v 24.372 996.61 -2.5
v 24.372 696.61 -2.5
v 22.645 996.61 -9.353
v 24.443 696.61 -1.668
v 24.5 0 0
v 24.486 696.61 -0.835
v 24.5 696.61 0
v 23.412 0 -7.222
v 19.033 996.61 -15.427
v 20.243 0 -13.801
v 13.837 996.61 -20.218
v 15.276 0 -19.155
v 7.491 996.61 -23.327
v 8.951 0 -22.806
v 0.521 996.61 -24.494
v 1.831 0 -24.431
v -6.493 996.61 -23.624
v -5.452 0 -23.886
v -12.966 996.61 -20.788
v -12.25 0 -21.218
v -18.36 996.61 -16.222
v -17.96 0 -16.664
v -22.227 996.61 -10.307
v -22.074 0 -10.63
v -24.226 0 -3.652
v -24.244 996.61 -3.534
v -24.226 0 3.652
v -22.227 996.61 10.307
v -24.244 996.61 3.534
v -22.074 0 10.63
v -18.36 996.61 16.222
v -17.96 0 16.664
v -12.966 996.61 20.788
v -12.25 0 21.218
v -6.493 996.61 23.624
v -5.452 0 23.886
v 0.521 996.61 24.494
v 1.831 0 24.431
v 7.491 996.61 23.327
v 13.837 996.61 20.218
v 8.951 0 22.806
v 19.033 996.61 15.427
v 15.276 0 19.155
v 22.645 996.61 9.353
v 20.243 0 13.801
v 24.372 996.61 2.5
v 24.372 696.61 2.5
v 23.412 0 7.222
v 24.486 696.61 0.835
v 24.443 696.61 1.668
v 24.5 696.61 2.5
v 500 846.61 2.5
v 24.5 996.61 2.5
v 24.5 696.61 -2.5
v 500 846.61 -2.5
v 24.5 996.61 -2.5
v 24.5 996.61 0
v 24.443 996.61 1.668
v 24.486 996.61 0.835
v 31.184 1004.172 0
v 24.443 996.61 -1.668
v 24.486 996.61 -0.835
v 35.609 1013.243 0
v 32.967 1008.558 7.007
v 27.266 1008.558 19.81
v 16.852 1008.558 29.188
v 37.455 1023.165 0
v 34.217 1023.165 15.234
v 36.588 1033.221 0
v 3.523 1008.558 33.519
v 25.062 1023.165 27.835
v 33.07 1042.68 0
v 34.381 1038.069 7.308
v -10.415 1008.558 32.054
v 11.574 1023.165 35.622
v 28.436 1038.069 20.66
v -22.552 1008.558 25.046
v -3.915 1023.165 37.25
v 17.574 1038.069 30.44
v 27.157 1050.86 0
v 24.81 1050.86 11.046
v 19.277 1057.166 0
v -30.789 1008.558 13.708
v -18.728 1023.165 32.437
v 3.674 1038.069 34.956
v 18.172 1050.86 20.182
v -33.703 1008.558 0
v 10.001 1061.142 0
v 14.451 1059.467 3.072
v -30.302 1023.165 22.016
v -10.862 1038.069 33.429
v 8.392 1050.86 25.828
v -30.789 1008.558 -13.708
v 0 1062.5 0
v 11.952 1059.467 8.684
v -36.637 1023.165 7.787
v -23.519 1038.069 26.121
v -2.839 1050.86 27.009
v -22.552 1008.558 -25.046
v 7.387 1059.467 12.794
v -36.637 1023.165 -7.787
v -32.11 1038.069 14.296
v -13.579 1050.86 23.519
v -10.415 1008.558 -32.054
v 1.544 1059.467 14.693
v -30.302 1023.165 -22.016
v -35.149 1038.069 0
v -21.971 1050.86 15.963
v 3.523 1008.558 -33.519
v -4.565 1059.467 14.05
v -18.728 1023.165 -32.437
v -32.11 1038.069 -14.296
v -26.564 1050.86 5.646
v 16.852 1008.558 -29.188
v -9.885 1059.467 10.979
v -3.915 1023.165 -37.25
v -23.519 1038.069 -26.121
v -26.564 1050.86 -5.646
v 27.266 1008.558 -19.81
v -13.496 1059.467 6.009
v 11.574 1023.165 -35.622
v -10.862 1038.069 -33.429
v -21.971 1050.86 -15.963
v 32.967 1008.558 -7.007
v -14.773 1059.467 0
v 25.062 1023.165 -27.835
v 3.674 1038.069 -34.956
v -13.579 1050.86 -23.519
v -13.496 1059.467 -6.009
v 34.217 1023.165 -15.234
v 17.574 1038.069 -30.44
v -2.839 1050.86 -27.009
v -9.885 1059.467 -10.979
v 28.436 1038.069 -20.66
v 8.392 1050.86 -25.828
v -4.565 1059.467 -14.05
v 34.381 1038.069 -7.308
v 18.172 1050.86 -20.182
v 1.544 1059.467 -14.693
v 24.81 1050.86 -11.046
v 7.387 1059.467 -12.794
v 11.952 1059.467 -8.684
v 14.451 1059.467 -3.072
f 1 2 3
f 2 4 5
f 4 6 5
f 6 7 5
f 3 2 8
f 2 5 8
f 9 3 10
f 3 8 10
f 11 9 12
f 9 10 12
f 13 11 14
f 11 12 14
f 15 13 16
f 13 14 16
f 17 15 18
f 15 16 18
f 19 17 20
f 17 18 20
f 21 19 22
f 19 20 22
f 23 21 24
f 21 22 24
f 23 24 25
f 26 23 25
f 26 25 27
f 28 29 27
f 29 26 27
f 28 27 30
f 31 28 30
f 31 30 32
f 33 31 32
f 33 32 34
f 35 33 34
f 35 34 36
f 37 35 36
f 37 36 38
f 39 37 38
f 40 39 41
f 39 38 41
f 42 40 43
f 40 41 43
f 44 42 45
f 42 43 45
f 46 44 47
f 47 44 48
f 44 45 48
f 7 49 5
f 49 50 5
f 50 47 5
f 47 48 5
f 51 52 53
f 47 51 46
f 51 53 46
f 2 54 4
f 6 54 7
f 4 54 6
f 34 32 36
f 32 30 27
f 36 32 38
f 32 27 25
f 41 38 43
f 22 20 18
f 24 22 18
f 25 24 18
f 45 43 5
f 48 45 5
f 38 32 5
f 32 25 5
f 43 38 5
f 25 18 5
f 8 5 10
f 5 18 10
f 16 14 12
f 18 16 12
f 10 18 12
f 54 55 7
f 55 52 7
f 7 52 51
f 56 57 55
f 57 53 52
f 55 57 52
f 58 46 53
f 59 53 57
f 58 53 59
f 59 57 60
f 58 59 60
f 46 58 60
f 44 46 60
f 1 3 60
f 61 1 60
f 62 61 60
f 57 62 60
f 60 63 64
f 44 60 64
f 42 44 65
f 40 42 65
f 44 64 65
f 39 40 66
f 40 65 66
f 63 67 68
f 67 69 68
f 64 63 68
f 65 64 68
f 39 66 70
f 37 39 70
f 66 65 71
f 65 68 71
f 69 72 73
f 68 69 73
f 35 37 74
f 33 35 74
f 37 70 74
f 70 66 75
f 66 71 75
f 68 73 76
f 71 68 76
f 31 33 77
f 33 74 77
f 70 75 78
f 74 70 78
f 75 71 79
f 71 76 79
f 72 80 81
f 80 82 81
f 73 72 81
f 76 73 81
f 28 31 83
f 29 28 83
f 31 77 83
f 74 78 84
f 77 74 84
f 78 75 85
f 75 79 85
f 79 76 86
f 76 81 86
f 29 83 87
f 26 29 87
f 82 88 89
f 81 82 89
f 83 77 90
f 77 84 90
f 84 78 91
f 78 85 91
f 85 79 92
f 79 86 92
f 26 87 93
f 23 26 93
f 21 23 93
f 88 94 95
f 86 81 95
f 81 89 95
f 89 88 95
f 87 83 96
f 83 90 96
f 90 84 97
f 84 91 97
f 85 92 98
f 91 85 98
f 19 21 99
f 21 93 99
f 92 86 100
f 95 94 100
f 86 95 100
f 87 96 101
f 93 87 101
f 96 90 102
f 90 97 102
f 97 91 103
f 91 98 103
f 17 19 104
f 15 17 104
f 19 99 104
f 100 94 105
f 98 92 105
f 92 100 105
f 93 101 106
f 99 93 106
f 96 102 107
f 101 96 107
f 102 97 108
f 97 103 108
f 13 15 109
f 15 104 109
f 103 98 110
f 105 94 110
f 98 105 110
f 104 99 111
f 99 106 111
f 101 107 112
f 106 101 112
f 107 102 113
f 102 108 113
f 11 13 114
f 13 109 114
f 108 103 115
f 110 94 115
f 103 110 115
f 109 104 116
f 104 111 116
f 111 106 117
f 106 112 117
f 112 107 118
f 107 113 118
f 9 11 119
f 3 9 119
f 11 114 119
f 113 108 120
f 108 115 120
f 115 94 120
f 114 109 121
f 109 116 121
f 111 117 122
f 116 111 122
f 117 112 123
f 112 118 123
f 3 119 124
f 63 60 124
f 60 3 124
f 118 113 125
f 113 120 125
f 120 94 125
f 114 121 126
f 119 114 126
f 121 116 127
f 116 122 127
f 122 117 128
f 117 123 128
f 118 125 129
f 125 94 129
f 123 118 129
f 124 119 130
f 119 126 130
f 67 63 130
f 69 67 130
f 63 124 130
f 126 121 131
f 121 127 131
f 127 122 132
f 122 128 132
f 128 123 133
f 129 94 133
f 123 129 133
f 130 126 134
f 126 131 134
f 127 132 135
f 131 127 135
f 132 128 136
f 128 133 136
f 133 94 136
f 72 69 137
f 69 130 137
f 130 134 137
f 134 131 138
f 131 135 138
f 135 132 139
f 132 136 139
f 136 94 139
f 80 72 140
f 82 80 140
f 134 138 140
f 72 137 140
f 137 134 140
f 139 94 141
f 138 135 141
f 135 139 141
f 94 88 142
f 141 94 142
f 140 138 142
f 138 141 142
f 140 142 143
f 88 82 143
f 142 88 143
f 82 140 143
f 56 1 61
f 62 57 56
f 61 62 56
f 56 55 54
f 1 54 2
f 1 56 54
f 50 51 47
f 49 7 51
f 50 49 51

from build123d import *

# Parameters (mm, degrees)
SKETCH1_R           = 24.5
BOSS_EXTRUDE1_DEPTH = 1000
BOSS_EXTRUDE2_DEPTH = 2.5


with BuildPart() as part:
    # Sketch1 → Boss-Extrude1 (new body)
    with BuildSketch(Plane(origin=(0, 0, 0), x_dir=(1, 0, 0), z_dir=(0, 1, 0))):
        Circle(SKETCH1_R)
    extrude(amount=BOSS_EXTRUDE1_DEPTH)

    # Sketch2 → Revolve5 (revolve)
    with BuildSketch(Plane.XY):
        with BuildLine():
            Line((0, 1062.5), (0, 987.5))
            ThreePointArc((0, 987.5), (37.5, 1025), (0, 1062.5))
        make_face()
    revolve(axis=Axis((0, 1062.5, 0), (0, -1, 0)))

    # Sketch3 → Boss-Extrude2 (add, symmetric)
    with BuildSketch(Plane.XY):
        Polygon((24.5, 996.609860867), (500, 846.609860867), (24.5, 696.609860867), (0, 696.609860867), (0, 996.609860867), align=None)
    extrude(amount=BOSS_EXTRUDE2_DEPTH, both=True)


solid = part.part
